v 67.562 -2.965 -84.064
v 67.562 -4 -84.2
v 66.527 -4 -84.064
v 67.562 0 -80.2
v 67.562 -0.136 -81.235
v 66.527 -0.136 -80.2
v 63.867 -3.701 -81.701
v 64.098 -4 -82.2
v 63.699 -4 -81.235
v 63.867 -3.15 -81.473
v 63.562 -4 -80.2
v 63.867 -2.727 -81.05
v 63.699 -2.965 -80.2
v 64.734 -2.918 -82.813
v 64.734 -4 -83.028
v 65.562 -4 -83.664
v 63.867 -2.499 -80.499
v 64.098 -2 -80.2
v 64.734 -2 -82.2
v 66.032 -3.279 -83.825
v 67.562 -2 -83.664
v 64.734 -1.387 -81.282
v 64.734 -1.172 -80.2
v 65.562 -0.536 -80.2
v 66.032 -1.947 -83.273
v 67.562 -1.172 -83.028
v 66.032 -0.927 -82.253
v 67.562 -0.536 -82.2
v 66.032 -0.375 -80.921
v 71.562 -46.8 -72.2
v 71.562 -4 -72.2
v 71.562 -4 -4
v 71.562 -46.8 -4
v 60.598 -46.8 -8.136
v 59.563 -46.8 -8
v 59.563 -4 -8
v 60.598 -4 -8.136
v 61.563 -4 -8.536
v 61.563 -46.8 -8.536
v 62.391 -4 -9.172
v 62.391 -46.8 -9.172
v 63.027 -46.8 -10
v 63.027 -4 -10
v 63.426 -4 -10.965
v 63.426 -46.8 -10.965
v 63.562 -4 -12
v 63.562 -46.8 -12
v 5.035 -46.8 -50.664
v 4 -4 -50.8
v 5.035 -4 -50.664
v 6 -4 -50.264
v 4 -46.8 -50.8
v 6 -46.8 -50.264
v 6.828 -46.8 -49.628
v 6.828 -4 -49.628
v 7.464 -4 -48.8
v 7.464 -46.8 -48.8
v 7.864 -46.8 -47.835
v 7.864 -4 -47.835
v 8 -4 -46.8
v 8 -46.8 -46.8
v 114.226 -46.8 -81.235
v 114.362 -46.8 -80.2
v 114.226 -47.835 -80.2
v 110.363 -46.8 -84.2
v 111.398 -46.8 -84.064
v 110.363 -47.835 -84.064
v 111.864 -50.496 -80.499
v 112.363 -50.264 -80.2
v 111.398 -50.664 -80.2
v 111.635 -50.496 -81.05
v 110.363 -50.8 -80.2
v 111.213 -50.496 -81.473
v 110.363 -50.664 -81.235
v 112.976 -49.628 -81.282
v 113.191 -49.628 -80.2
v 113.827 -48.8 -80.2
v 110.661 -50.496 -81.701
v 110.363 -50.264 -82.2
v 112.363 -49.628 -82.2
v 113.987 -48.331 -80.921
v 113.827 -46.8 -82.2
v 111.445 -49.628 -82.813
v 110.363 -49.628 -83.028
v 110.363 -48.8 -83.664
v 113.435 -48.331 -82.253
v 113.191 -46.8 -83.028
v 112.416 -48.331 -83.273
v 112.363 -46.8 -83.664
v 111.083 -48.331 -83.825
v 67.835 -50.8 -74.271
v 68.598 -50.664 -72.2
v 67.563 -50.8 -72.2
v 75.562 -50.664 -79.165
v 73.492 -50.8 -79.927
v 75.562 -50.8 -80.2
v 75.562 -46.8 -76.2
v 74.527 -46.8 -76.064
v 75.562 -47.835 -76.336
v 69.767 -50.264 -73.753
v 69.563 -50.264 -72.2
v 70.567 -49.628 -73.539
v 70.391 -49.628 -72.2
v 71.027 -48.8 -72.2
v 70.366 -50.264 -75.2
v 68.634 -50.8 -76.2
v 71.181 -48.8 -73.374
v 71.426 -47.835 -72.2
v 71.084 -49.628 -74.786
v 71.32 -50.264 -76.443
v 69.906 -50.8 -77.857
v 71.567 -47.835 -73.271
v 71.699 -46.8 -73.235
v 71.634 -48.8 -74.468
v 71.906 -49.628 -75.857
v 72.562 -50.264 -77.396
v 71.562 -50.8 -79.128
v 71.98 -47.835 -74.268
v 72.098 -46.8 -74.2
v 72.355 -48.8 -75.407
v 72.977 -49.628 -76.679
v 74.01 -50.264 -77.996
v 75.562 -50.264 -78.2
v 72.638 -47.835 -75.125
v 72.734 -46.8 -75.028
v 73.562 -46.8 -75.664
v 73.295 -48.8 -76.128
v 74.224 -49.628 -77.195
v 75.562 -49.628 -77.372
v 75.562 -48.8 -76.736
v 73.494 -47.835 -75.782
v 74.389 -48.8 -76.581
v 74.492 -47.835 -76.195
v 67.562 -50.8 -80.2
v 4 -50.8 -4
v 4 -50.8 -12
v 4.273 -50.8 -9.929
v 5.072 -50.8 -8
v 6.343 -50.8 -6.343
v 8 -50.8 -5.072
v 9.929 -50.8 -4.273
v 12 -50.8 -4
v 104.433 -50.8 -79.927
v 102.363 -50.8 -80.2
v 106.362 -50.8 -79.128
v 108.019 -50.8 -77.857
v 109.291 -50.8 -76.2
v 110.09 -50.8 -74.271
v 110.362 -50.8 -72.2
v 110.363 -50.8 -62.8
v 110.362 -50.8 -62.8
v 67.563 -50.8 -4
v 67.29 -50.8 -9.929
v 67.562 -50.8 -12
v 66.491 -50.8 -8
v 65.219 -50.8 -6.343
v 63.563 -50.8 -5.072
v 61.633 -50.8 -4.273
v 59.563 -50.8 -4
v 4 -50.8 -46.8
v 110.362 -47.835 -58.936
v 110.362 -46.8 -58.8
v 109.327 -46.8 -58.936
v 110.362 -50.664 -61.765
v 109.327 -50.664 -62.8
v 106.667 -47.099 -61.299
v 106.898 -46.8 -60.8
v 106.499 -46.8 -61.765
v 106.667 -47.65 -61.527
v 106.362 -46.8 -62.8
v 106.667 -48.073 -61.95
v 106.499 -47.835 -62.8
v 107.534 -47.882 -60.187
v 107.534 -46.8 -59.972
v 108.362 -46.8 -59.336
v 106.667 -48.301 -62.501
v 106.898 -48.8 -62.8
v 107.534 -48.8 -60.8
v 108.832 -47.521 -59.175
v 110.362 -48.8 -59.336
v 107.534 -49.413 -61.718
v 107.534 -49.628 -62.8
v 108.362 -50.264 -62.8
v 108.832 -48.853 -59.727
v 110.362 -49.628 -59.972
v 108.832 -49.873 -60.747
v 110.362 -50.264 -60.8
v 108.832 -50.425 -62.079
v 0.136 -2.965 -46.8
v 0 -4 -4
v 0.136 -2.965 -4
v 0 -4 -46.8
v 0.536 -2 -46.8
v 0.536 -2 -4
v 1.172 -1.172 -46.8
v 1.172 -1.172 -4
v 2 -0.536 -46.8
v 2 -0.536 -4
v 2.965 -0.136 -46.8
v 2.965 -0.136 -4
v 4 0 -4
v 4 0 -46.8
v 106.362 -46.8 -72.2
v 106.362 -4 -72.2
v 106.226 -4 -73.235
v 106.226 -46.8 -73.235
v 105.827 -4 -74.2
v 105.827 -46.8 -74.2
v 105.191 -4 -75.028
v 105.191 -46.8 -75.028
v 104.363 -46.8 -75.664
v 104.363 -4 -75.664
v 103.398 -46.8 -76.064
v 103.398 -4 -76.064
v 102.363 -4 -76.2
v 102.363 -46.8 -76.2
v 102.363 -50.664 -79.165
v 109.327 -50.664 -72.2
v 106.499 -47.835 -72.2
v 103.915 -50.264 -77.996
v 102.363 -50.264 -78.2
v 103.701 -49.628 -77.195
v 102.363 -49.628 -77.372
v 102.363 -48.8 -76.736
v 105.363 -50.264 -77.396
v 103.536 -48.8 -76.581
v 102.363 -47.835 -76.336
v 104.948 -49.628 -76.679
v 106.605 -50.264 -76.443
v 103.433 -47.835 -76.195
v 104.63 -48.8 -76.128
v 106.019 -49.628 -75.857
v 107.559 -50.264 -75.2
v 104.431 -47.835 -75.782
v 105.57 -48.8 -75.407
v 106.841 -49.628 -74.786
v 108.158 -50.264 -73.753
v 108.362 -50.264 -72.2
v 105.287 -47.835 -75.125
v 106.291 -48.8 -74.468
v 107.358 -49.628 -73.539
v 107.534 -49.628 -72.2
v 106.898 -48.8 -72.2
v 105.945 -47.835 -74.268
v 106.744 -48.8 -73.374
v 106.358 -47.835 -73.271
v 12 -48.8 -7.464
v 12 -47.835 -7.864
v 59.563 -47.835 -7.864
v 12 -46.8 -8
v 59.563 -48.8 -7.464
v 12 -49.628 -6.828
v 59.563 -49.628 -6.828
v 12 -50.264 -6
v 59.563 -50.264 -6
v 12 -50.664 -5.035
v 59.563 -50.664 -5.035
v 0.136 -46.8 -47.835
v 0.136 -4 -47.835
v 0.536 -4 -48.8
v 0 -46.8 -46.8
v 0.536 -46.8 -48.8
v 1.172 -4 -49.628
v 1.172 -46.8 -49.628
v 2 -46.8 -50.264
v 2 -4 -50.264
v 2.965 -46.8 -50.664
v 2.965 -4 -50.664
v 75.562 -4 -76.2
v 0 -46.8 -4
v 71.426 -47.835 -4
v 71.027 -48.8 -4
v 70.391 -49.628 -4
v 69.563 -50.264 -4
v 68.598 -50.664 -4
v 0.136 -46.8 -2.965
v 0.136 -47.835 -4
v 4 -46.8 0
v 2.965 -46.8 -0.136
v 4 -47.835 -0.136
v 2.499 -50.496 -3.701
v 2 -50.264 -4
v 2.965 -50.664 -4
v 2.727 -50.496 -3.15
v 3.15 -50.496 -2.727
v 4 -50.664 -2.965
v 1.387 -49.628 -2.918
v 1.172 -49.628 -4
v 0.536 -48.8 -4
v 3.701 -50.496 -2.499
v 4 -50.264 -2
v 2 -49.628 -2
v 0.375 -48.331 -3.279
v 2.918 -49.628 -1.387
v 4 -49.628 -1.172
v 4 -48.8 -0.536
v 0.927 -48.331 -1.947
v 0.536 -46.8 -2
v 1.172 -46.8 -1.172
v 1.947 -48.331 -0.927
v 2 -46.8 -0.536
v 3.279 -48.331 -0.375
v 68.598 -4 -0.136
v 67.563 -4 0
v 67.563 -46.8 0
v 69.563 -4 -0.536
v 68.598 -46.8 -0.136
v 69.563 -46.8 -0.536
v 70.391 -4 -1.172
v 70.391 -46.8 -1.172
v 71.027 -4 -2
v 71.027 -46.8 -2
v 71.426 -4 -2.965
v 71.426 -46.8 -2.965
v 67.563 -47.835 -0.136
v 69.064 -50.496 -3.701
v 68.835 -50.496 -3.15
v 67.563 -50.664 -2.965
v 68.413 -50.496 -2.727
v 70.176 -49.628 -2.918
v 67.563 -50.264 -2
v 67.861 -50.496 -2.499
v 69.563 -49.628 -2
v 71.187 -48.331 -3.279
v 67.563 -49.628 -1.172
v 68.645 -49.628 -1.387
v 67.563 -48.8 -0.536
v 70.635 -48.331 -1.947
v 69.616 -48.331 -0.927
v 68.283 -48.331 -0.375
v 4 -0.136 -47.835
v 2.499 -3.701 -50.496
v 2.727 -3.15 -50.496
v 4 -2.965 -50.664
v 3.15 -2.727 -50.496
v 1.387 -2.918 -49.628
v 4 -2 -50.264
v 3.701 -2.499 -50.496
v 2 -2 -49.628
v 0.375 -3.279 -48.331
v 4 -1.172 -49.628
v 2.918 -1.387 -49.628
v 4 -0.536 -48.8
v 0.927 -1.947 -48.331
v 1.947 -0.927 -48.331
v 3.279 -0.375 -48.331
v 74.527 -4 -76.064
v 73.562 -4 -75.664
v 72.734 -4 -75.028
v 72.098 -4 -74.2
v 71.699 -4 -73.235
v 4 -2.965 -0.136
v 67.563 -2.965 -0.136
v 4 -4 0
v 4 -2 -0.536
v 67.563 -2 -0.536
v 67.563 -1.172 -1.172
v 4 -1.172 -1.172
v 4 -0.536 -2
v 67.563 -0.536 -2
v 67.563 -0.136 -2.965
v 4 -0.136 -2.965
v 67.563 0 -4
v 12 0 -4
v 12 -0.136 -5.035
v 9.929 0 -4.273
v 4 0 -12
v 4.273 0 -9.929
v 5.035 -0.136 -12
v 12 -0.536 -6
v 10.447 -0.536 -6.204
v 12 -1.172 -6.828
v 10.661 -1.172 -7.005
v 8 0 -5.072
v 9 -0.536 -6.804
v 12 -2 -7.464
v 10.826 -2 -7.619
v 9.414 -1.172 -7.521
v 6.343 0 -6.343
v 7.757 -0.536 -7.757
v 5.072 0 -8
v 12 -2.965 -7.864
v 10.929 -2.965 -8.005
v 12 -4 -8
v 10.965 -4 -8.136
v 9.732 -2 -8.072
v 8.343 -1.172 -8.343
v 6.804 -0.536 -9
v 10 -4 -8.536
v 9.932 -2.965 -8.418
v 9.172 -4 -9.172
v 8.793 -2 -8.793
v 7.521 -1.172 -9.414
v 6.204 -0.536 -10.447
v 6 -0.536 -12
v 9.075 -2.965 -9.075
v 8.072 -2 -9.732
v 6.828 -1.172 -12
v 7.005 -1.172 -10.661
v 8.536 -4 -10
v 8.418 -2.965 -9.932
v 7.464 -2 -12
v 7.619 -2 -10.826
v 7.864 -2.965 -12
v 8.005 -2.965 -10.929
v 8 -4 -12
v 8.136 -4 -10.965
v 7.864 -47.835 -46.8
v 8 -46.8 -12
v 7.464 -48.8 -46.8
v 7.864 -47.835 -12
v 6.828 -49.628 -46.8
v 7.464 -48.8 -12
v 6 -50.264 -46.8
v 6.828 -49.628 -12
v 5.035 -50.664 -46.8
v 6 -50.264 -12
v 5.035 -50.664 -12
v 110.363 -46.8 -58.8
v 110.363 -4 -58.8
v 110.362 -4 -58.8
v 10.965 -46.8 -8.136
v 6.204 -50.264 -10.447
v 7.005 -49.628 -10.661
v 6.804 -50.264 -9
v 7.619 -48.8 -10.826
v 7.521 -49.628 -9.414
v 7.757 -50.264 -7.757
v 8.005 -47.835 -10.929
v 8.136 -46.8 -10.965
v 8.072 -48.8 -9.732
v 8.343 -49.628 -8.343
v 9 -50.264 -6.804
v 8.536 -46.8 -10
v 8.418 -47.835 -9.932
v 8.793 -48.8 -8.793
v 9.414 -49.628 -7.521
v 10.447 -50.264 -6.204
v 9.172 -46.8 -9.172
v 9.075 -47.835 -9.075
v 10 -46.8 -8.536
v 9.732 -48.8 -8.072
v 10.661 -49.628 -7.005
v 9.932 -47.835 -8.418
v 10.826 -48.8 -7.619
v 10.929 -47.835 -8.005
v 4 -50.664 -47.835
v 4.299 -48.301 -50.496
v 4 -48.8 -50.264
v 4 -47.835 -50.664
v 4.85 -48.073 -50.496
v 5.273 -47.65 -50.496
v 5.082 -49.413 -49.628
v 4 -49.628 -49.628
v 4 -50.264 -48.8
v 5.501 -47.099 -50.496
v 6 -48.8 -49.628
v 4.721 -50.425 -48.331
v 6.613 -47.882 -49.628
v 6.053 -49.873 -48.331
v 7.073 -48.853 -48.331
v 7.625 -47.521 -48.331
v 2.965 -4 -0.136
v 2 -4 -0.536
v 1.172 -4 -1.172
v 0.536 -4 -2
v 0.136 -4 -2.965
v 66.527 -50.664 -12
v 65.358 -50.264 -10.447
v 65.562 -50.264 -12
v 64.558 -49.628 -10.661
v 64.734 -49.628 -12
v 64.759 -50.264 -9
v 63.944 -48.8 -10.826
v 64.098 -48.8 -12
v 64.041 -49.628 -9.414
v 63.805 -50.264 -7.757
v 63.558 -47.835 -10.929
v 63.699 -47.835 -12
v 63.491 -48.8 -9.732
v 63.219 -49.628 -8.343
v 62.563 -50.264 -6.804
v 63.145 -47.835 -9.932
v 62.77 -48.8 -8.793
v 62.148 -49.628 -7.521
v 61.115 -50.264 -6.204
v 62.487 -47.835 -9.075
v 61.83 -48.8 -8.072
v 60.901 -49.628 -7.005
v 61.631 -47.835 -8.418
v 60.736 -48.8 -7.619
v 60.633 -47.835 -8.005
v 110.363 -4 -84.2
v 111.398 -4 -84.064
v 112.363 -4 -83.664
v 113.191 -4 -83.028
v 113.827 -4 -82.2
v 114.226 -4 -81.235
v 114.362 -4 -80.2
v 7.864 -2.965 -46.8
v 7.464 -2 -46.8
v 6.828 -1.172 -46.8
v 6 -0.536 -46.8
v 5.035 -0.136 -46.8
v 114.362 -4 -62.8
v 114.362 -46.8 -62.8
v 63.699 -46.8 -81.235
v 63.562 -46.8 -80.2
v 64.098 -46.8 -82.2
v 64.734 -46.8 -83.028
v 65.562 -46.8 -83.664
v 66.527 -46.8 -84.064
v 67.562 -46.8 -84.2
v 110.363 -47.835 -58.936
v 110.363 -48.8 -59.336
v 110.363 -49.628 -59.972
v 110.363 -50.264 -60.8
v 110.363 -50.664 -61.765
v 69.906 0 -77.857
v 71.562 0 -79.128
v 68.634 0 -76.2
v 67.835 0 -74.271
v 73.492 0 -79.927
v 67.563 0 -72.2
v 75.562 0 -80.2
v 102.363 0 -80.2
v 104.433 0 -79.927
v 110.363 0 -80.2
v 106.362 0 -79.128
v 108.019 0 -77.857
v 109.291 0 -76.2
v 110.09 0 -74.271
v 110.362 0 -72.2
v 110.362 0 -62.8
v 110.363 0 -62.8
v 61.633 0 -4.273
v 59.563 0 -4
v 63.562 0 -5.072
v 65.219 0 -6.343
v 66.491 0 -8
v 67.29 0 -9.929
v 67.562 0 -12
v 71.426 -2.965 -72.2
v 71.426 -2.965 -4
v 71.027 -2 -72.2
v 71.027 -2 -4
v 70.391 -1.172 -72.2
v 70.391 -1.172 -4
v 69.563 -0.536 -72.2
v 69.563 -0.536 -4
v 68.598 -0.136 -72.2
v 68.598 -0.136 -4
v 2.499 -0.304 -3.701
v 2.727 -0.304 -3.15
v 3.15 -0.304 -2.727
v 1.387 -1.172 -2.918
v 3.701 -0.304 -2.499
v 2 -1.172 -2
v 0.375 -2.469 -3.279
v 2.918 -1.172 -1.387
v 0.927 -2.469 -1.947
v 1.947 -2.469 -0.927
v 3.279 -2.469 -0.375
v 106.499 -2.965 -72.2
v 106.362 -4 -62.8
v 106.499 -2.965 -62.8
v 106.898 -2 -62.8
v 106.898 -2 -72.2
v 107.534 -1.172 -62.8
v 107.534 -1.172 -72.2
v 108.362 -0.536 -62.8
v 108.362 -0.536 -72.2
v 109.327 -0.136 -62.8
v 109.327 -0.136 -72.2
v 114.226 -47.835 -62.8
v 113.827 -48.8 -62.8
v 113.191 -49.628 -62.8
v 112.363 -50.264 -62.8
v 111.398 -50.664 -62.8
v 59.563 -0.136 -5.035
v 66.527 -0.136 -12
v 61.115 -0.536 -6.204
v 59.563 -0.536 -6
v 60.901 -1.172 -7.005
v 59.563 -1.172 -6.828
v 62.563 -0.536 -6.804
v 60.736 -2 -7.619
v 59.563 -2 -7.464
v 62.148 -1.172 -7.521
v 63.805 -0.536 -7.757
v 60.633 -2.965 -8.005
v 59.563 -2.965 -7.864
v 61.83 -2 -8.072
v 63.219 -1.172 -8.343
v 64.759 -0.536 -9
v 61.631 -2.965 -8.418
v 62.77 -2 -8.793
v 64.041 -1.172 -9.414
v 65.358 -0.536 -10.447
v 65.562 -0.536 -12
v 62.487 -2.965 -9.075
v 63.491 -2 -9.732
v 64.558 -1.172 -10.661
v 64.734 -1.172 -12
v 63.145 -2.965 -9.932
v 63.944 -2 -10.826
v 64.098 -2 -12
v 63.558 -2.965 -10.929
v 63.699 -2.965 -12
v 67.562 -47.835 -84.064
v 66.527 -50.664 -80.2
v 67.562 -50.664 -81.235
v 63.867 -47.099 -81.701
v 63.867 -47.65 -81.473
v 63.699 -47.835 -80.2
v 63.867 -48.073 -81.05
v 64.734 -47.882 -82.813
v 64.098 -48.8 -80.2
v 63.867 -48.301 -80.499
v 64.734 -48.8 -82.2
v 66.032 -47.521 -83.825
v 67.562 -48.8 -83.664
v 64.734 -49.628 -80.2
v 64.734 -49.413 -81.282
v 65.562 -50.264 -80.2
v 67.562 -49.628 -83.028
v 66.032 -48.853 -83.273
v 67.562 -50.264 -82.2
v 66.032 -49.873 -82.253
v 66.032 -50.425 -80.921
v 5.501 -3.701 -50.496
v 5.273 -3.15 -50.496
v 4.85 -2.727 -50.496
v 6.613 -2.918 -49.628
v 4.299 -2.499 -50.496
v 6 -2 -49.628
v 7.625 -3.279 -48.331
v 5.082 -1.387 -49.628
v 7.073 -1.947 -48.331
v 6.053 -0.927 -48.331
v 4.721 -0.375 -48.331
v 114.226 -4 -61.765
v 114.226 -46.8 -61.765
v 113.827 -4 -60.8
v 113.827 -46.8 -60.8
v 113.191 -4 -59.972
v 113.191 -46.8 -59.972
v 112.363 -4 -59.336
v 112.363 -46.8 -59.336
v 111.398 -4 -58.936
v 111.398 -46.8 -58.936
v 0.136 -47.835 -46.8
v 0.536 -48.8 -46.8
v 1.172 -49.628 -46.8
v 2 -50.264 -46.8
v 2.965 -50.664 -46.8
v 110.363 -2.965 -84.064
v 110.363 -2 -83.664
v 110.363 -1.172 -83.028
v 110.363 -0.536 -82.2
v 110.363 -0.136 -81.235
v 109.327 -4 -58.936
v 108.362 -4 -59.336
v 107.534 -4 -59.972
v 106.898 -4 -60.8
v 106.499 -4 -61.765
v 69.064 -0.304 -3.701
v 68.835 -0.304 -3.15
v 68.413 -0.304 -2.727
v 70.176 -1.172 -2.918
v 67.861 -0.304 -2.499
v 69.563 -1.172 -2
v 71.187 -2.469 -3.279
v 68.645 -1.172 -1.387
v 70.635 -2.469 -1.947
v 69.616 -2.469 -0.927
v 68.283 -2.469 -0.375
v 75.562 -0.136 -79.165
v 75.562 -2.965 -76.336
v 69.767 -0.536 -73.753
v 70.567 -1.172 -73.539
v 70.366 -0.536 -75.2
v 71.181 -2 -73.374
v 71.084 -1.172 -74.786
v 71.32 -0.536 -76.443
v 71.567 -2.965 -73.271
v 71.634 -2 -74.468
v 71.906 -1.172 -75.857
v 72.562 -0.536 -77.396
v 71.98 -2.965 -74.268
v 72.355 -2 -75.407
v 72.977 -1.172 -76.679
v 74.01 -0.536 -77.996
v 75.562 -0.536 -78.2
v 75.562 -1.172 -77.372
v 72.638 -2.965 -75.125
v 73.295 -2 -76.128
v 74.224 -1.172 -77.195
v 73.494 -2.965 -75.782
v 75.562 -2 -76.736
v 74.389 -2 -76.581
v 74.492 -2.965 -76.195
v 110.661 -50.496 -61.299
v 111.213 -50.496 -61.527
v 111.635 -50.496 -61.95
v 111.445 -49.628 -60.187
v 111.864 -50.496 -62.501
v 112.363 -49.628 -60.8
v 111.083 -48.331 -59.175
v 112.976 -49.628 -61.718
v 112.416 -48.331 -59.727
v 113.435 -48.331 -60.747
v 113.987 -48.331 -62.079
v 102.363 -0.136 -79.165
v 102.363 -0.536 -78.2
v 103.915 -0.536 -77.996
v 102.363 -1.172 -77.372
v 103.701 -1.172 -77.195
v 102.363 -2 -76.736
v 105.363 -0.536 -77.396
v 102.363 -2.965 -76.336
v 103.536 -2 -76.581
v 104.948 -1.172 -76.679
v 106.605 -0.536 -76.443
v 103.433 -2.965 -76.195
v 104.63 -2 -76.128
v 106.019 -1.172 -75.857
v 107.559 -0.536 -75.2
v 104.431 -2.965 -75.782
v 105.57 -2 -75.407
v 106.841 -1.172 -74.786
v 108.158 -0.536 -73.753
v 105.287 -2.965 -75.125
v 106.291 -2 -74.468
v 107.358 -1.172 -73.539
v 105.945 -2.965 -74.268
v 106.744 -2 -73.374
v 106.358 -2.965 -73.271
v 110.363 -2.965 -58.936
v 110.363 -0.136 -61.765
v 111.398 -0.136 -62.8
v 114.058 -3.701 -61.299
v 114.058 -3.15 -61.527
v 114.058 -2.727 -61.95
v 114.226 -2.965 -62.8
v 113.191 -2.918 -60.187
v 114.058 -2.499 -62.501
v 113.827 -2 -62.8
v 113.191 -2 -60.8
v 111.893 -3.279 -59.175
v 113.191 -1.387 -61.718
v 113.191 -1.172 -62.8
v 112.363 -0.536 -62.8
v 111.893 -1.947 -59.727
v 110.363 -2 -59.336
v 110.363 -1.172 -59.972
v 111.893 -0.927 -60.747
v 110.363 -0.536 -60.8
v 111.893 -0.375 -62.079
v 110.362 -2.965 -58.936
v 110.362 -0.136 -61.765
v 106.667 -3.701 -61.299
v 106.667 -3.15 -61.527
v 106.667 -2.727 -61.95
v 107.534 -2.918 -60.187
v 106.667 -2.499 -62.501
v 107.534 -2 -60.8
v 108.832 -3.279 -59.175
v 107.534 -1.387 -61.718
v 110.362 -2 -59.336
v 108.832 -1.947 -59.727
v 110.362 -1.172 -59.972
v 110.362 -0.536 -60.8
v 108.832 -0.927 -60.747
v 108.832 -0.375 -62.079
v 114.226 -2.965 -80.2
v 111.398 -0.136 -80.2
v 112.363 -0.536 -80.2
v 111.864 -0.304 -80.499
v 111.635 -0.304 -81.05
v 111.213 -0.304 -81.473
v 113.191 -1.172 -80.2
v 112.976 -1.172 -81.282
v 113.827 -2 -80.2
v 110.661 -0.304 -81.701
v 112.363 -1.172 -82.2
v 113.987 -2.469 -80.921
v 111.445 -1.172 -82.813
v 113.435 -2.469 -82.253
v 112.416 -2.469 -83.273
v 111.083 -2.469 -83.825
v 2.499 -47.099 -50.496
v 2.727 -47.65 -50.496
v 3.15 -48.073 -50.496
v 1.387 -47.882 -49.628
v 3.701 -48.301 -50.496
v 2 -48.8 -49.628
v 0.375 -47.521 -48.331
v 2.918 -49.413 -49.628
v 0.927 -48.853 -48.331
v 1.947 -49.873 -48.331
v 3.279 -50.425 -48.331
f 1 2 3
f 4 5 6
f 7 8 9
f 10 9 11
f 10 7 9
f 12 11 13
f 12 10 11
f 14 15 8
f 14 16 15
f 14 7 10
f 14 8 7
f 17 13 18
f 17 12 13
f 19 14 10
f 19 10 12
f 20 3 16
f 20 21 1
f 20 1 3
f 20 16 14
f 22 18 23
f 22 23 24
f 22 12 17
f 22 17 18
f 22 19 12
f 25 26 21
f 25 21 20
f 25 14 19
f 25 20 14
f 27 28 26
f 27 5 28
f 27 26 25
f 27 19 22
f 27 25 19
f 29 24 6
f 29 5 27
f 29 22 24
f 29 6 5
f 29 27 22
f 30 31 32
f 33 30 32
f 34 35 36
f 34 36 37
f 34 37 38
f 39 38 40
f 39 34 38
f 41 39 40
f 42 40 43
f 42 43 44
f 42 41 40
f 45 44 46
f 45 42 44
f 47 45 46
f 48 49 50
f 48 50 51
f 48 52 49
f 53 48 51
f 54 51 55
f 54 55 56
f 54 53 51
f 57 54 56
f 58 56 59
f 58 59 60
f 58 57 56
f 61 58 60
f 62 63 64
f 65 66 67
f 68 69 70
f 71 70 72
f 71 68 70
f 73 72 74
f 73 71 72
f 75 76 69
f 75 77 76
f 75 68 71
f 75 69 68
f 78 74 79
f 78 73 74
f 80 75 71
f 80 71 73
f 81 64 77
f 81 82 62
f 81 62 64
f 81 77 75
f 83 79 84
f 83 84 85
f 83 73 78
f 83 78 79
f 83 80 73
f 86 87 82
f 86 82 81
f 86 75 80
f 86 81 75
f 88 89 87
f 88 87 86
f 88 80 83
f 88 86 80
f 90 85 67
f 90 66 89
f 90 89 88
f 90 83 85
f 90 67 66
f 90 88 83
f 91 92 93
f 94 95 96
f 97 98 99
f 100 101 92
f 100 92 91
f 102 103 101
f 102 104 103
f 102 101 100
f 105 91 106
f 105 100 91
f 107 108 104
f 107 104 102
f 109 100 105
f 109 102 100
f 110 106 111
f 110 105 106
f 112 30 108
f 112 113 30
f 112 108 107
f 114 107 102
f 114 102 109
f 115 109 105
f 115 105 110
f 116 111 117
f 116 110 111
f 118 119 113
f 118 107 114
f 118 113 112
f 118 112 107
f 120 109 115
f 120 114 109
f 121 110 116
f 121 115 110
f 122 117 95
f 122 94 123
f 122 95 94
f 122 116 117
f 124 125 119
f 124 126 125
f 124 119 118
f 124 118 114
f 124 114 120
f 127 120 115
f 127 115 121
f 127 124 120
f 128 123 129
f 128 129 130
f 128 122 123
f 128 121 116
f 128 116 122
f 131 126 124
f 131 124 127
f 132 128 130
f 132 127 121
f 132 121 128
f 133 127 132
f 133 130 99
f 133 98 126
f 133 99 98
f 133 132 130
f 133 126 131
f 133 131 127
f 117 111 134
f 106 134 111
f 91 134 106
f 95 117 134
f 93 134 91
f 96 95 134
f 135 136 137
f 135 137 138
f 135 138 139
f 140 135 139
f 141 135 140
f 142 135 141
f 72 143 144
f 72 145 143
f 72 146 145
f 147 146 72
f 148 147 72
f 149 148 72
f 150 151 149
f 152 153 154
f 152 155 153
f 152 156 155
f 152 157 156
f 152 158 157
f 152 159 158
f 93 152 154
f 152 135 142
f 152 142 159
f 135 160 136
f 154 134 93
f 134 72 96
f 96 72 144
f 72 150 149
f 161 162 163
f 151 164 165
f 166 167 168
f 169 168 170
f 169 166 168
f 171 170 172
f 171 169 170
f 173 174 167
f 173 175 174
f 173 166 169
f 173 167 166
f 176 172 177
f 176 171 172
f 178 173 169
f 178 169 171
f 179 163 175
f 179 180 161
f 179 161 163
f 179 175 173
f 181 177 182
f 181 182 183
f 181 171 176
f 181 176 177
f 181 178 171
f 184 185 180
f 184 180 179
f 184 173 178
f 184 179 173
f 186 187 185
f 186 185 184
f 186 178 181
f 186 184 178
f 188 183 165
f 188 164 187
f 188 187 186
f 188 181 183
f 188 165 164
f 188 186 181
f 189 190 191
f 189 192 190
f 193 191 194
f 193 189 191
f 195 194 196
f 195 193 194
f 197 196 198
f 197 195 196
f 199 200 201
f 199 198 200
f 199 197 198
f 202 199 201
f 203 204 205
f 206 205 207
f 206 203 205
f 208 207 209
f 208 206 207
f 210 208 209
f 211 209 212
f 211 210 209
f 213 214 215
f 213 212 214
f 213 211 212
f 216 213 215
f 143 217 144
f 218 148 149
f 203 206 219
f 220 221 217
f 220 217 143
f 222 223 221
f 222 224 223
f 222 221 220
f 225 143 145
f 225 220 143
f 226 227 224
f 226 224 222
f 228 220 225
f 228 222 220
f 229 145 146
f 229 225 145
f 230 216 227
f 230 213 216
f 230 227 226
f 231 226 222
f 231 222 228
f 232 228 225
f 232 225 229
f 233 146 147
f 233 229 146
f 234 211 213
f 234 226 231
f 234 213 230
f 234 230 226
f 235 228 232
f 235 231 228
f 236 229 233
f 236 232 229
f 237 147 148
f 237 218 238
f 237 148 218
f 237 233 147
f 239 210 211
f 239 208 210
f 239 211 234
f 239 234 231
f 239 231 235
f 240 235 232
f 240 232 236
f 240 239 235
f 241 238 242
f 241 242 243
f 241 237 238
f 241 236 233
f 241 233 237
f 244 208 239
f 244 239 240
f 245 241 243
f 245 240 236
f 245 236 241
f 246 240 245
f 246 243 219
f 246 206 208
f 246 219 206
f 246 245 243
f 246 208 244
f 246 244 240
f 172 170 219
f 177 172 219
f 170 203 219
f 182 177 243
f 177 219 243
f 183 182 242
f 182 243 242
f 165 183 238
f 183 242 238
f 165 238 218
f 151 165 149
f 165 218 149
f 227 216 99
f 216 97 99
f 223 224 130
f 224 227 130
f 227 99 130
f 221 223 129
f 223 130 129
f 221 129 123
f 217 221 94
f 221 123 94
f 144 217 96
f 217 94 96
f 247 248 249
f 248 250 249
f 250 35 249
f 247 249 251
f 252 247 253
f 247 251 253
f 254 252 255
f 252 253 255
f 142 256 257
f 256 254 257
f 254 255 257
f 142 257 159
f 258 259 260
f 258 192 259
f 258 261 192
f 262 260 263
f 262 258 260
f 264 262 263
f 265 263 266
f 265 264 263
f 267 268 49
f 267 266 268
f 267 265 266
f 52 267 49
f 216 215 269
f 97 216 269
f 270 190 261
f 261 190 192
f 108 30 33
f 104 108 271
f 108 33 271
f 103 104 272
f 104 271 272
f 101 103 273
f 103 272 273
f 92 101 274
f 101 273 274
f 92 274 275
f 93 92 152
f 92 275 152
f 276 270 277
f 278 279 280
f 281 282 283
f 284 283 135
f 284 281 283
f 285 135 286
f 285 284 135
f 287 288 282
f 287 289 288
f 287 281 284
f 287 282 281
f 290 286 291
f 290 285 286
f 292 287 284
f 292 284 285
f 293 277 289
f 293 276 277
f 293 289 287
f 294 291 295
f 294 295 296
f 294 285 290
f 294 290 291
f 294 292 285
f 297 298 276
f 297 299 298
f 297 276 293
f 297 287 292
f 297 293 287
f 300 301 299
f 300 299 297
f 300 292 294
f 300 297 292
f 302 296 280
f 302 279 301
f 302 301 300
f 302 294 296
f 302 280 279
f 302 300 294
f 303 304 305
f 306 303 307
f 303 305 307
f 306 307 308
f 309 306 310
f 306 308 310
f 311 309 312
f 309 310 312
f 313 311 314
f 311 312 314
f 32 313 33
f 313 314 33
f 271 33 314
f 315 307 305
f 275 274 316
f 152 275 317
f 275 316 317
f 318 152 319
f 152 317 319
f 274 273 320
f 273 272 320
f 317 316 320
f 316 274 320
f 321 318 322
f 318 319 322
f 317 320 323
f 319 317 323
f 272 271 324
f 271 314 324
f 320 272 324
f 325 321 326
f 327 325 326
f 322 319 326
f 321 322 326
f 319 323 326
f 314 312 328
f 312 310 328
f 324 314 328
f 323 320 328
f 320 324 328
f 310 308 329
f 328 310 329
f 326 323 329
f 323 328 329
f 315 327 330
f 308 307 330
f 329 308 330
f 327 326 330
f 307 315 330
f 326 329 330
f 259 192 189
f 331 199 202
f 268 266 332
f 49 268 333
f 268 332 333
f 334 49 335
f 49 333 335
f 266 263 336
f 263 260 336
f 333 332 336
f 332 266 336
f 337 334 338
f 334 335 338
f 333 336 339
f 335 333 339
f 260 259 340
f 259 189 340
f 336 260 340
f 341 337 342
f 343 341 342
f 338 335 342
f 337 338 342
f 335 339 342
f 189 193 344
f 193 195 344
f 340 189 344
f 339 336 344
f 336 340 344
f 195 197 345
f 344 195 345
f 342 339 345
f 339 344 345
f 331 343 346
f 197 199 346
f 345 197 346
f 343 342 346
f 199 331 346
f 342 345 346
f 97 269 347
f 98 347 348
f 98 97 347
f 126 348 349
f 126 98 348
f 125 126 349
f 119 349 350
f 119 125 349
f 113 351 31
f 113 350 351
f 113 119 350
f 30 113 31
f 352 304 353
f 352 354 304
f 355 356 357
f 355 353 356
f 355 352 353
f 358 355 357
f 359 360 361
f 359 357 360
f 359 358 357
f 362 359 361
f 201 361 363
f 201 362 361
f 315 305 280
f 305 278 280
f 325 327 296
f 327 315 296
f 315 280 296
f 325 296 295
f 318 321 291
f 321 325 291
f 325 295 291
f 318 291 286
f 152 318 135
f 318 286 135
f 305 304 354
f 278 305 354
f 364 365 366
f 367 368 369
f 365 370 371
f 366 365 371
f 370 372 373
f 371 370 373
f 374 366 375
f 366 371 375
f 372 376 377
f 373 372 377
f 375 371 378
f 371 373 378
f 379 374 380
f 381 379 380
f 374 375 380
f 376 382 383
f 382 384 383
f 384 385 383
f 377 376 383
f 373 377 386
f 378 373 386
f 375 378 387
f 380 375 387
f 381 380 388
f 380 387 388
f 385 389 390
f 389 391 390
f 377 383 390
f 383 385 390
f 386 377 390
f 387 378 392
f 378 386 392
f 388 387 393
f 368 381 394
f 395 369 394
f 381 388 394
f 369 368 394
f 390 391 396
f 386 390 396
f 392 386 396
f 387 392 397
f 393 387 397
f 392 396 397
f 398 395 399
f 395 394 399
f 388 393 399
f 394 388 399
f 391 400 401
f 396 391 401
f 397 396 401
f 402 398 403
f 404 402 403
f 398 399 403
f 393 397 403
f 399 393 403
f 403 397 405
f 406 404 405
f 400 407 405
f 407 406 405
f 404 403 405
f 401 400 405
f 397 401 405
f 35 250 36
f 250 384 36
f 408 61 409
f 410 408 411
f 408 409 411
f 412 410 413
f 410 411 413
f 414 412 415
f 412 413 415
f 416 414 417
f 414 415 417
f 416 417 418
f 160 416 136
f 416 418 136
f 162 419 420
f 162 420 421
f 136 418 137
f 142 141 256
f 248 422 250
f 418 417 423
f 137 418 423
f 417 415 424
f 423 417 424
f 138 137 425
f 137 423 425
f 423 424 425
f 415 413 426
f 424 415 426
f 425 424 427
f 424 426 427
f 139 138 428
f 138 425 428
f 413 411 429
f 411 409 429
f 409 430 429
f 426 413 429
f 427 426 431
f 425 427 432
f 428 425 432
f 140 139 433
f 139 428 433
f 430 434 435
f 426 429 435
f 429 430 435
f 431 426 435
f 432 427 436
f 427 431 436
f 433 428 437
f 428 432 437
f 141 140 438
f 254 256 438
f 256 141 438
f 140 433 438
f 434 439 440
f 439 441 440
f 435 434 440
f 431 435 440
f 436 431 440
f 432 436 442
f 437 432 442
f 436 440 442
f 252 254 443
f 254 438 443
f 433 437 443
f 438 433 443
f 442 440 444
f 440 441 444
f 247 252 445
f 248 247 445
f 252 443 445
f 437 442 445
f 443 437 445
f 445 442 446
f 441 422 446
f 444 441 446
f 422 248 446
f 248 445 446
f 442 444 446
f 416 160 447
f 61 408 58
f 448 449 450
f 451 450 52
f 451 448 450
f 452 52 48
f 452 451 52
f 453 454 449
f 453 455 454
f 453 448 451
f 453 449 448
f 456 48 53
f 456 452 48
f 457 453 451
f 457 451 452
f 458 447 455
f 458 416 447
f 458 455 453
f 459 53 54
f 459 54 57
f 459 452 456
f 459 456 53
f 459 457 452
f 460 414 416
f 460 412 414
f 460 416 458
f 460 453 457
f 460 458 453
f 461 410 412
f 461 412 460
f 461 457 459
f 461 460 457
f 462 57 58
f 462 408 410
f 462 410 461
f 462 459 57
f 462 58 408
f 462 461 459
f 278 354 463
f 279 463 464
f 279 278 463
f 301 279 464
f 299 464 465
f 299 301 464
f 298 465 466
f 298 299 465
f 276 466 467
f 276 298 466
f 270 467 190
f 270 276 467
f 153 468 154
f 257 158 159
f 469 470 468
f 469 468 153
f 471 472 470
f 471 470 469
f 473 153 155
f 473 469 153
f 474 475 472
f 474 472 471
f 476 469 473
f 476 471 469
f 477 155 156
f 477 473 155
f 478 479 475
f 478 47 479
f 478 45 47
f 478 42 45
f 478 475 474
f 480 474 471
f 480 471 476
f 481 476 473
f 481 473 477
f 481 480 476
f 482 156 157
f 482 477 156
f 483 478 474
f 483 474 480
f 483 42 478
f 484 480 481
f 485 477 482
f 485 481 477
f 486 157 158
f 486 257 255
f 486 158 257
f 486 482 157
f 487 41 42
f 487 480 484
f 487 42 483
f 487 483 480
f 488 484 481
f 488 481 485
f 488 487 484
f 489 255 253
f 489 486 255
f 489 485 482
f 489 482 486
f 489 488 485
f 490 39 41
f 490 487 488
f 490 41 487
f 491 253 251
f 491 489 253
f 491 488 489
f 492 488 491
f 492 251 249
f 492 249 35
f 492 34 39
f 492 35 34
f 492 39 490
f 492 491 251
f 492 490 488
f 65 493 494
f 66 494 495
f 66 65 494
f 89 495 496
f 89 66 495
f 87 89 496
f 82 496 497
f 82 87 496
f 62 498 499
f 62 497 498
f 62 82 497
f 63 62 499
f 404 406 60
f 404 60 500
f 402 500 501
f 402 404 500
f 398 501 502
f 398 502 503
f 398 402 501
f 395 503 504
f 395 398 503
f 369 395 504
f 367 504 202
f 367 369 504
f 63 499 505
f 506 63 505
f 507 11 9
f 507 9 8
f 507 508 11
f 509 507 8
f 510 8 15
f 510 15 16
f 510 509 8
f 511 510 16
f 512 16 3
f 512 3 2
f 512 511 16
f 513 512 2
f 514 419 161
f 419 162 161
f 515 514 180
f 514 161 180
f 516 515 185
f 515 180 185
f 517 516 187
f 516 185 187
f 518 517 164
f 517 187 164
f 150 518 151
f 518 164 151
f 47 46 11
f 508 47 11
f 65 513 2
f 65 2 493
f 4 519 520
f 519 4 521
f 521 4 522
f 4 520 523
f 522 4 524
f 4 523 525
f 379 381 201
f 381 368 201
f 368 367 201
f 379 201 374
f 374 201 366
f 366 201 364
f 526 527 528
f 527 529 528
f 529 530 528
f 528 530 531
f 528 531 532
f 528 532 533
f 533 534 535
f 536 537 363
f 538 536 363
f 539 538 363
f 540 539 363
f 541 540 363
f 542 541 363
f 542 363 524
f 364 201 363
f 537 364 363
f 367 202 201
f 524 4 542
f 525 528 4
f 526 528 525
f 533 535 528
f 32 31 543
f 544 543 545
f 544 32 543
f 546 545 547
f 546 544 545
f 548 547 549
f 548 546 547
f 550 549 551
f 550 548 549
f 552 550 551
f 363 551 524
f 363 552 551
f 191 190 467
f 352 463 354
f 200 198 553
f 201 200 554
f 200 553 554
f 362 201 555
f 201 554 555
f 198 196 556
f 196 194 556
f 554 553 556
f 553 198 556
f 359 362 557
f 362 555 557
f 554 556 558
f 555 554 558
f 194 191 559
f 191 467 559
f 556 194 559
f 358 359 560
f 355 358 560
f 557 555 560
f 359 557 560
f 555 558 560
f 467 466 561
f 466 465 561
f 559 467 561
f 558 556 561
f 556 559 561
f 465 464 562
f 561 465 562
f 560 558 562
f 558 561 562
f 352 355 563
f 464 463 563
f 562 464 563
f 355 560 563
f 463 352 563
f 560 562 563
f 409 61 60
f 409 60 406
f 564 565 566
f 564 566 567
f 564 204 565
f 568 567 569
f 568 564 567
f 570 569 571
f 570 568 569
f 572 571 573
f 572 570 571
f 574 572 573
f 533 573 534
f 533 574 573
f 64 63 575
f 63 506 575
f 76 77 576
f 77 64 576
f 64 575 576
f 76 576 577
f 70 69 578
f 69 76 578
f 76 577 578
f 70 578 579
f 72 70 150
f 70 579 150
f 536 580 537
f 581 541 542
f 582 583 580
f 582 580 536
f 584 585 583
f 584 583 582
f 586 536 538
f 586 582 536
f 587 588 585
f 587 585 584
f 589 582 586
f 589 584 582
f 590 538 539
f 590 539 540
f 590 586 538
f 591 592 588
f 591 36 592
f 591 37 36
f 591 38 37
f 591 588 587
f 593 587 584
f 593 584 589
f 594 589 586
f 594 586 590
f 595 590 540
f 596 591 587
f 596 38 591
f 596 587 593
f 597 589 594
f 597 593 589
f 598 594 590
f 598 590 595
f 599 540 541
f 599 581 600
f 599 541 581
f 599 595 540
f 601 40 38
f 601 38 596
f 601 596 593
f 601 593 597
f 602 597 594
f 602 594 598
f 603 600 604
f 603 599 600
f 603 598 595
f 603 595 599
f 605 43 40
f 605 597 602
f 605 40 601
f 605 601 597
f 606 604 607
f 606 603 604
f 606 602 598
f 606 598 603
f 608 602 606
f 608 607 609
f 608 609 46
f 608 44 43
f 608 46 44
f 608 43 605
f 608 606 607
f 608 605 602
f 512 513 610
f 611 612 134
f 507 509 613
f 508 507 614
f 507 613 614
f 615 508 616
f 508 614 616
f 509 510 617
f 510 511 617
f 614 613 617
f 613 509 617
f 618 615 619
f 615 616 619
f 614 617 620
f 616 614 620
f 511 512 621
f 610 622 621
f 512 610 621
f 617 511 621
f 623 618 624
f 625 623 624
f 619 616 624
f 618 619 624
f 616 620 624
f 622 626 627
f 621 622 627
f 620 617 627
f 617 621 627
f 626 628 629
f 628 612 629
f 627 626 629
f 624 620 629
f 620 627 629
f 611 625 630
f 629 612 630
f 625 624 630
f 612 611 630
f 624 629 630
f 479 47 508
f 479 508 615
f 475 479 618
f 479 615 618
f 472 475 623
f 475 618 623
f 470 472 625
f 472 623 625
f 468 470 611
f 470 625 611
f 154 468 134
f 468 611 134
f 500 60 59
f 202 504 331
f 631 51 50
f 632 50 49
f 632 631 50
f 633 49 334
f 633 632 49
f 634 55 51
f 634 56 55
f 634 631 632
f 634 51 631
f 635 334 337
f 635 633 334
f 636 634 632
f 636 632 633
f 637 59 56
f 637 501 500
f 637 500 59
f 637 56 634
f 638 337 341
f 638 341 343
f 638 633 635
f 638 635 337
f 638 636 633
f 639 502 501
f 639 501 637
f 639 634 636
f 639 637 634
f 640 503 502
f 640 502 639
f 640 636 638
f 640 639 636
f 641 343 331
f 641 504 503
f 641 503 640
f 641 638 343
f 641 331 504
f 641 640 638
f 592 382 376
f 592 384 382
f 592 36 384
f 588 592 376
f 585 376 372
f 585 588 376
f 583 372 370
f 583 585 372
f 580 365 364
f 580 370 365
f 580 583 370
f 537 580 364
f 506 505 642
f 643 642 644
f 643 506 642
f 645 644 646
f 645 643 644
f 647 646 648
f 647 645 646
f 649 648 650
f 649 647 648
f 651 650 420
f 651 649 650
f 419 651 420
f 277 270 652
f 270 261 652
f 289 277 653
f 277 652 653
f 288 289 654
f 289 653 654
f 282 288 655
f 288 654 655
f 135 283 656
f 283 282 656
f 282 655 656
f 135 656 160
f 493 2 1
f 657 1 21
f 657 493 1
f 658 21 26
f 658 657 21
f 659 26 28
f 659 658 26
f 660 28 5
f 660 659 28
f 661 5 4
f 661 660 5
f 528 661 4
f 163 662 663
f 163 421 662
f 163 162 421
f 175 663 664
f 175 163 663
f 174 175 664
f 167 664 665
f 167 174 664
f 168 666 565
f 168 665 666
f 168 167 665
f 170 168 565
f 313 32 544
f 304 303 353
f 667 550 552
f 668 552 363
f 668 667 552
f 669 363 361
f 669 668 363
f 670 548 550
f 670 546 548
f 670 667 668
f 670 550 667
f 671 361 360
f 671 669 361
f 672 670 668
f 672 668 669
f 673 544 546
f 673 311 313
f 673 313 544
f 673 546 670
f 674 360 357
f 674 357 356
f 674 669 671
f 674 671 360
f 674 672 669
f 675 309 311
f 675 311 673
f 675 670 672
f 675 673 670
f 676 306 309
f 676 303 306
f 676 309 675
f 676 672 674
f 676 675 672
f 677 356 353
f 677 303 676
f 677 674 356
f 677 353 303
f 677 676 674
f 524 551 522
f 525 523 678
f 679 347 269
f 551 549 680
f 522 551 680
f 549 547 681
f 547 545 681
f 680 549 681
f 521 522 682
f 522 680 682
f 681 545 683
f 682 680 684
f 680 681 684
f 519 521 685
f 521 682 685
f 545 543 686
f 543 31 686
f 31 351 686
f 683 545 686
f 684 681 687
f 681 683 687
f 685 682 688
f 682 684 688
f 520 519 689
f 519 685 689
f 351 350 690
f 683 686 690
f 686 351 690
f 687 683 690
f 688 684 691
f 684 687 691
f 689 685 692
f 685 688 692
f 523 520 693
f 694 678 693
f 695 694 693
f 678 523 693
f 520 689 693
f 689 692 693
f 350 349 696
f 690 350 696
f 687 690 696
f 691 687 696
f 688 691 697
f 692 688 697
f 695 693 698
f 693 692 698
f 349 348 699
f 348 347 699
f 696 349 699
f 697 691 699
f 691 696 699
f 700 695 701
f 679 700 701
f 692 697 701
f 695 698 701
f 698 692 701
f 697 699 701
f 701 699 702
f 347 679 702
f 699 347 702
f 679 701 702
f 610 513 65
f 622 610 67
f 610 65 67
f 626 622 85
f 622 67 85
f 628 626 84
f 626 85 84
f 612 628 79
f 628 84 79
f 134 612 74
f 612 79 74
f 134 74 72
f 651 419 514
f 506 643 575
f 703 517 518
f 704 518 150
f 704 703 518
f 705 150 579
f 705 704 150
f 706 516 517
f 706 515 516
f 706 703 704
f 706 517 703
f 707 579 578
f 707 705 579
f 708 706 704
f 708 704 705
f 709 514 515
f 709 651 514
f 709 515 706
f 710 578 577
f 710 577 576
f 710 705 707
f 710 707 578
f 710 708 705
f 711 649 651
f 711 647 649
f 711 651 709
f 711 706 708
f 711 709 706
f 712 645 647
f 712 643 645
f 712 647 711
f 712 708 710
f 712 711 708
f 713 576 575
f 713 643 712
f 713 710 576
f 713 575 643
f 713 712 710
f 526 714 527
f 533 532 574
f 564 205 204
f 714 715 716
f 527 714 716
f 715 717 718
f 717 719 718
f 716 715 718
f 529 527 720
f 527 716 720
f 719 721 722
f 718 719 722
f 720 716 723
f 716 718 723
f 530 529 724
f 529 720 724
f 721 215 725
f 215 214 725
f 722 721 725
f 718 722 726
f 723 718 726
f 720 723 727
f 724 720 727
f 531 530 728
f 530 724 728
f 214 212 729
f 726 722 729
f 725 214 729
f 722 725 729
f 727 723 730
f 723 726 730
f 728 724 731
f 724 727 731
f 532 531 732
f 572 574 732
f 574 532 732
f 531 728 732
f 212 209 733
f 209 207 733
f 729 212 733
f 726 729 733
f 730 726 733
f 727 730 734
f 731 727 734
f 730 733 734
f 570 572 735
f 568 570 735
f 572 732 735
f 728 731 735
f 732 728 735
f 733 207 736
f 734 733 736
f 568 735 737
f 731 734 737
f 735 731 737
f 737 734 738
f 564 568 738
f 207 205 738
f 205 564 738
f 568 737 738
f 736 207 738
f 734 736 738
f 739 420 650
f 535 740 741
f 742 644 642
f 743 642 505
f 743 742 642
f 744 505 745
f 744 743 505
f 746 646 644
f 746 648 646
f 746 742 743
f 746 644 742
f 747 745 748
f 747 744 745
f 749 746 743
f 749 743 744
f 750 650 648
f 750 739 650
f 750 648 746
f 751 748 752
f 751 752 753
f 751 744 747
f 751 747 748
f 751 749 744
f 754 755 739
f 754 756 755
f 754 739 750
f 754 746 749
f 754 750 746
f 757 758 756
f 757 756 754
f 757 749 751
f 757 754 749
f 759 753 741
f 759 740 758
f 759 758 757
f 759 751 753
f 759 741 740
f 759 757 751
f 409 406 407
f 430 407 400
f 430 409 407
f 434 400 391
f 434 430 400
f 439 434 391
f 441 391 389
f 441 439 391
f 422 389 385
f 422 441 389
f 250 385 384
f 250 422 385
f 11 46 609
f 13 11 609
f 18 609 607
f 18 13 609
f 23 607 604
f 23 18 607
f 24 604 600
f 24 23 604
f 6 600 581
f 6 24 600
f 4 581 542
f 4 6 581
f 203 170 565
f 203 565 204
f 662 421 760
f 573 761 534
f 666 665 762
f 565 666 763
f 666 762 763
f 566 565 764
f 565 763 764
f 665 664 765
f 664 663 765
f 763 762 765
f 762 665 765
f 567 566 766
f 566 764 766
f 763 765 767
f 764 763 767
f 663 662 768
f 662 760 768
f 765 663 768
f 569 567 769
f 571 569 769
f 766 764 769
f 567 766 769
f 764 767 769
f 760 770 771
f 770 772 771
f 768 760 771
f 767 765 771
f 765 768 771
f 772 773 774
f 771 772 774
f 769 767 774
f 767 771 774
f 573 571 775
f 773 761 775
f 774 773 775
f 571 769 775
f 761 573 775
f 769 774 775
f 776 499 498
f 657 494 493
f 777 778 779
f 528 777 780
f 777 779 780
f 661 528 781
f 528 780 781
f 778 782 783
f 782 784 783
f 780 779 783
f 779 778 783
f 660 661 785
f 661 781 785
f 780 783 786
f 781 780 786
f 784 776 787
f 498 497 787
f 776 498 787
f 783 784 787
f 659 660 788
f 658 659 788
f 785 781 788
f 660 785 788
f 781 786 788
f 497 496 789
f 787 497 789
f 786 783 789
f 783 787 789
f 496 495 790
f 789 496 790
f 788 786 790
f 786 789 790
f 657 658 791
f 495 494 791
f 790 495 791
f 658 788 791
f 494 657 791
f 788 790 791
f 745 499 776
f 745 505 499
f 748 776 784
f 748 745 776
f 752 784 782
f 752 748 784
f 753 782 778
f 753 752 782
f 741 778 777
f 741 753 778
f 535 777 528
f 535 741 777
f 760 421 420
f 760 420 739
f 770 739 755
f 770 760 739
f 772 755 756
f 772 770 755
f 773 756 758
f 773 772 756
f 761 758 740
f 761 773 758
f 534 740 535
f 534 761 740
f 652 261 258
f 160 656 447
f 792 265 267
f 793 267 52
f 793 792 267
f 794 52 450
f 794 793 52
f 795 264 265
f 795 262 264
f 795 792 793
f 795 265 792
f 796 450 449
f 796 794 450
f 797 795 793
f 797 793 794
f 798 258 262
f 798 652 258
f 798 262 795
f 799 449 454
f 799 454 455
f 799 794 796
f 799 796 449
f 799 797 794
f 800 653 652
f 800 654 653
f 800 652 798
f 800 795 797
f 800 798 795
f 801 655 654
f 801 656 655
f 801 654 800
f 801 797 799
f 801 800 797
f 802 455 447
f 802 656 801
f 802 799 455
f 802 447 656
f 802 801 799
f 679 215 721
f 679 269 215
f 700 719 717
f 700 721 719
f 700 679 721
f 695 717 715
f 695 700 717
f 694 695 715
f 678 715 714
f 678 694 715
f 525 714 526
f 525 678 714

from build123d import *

# Parameters (mm, degrees)
F1_DEPTH = 50.8
F2_R     = 3.99999


# Not quite as in the source:
# - a fillet or chamfer is up to 0.001 mm smaller than in the source, because OpenCascade refuses the exact size


with BuildPart() as f1:
    # F0 (on Front) → F1 (new body)
    with BuildSketch(Plane.XZ):
        Polygon((71.5625, 0), (0, 0), (0, -50.8), (8, -50.8), (8, -8), (63.5625, -8), (63.5625, -84.2), (114.3625, -84.2), (114.3625, -58.8), (106.3625, -58.8), (106.3625, -76.2), (71.5625, -76.2), align=None)
    extrude(amount=F1_DEPTH)

    # F2 (radius 4 in the source; OpenCascade refuses exactly that, so slightly less here)
    f2_edges = [f1.edges().sort_by_distance(p)[0] for p in [
        (0, -25.4, 0),
        (71.5625, -25.4, 0),
        (71.5625, -25.4, -76.2),
        (106.3625, -25.4, -76.2),
        (71.5625, -50.8, -38.1),
        (71.5625, 0, -38.1),
        (110.3625, 0, -58.8),
        (114.3625, -25.4, -58.8),
        (110.3625, -50.8, -58.8),
        (106.3625, -25.4, -58.8),
        (114.3625, -25.4, -84.2),
        (114.3625, -50.8, -71.5),
        (114.3625, 0, -71.5),
        (88.9625, 0, -84.2),
        (88.9625, -50.8, -84.2),
        (63.5625, -25.4, -84.2),
        (63.5625, -50.8, -46.1),
        (63.5625, 0, -46.1),
        (0, 0, -25.4),
        (0, -50.8, -25.4),
        (0, -25.4, -50.8),
        (88.9625, 0, -76.2),
        (8, 0, -29.4),
        (8, -50.8, -29.4),
        (35.78125, -50.8, -8),
        (88.9625, -50.8, -76.2),
        (106.3625, 0, -67.5),
        (4, -50.8, -50.8),
        (106.3625, -50.8, -67.5),
        (8, -25.4, -50.8),
        (35.78125, -50.8, 0),
        (35.78125, 0, 0),
        (8, -25.4, -8),
        (63.5625, -25.4, -8),
        (4, 0, -50.8),
        (35.78125, 0, -8),
    ]]
    fillet(f2_edges, radius=F2_R)


solid = f1.part
